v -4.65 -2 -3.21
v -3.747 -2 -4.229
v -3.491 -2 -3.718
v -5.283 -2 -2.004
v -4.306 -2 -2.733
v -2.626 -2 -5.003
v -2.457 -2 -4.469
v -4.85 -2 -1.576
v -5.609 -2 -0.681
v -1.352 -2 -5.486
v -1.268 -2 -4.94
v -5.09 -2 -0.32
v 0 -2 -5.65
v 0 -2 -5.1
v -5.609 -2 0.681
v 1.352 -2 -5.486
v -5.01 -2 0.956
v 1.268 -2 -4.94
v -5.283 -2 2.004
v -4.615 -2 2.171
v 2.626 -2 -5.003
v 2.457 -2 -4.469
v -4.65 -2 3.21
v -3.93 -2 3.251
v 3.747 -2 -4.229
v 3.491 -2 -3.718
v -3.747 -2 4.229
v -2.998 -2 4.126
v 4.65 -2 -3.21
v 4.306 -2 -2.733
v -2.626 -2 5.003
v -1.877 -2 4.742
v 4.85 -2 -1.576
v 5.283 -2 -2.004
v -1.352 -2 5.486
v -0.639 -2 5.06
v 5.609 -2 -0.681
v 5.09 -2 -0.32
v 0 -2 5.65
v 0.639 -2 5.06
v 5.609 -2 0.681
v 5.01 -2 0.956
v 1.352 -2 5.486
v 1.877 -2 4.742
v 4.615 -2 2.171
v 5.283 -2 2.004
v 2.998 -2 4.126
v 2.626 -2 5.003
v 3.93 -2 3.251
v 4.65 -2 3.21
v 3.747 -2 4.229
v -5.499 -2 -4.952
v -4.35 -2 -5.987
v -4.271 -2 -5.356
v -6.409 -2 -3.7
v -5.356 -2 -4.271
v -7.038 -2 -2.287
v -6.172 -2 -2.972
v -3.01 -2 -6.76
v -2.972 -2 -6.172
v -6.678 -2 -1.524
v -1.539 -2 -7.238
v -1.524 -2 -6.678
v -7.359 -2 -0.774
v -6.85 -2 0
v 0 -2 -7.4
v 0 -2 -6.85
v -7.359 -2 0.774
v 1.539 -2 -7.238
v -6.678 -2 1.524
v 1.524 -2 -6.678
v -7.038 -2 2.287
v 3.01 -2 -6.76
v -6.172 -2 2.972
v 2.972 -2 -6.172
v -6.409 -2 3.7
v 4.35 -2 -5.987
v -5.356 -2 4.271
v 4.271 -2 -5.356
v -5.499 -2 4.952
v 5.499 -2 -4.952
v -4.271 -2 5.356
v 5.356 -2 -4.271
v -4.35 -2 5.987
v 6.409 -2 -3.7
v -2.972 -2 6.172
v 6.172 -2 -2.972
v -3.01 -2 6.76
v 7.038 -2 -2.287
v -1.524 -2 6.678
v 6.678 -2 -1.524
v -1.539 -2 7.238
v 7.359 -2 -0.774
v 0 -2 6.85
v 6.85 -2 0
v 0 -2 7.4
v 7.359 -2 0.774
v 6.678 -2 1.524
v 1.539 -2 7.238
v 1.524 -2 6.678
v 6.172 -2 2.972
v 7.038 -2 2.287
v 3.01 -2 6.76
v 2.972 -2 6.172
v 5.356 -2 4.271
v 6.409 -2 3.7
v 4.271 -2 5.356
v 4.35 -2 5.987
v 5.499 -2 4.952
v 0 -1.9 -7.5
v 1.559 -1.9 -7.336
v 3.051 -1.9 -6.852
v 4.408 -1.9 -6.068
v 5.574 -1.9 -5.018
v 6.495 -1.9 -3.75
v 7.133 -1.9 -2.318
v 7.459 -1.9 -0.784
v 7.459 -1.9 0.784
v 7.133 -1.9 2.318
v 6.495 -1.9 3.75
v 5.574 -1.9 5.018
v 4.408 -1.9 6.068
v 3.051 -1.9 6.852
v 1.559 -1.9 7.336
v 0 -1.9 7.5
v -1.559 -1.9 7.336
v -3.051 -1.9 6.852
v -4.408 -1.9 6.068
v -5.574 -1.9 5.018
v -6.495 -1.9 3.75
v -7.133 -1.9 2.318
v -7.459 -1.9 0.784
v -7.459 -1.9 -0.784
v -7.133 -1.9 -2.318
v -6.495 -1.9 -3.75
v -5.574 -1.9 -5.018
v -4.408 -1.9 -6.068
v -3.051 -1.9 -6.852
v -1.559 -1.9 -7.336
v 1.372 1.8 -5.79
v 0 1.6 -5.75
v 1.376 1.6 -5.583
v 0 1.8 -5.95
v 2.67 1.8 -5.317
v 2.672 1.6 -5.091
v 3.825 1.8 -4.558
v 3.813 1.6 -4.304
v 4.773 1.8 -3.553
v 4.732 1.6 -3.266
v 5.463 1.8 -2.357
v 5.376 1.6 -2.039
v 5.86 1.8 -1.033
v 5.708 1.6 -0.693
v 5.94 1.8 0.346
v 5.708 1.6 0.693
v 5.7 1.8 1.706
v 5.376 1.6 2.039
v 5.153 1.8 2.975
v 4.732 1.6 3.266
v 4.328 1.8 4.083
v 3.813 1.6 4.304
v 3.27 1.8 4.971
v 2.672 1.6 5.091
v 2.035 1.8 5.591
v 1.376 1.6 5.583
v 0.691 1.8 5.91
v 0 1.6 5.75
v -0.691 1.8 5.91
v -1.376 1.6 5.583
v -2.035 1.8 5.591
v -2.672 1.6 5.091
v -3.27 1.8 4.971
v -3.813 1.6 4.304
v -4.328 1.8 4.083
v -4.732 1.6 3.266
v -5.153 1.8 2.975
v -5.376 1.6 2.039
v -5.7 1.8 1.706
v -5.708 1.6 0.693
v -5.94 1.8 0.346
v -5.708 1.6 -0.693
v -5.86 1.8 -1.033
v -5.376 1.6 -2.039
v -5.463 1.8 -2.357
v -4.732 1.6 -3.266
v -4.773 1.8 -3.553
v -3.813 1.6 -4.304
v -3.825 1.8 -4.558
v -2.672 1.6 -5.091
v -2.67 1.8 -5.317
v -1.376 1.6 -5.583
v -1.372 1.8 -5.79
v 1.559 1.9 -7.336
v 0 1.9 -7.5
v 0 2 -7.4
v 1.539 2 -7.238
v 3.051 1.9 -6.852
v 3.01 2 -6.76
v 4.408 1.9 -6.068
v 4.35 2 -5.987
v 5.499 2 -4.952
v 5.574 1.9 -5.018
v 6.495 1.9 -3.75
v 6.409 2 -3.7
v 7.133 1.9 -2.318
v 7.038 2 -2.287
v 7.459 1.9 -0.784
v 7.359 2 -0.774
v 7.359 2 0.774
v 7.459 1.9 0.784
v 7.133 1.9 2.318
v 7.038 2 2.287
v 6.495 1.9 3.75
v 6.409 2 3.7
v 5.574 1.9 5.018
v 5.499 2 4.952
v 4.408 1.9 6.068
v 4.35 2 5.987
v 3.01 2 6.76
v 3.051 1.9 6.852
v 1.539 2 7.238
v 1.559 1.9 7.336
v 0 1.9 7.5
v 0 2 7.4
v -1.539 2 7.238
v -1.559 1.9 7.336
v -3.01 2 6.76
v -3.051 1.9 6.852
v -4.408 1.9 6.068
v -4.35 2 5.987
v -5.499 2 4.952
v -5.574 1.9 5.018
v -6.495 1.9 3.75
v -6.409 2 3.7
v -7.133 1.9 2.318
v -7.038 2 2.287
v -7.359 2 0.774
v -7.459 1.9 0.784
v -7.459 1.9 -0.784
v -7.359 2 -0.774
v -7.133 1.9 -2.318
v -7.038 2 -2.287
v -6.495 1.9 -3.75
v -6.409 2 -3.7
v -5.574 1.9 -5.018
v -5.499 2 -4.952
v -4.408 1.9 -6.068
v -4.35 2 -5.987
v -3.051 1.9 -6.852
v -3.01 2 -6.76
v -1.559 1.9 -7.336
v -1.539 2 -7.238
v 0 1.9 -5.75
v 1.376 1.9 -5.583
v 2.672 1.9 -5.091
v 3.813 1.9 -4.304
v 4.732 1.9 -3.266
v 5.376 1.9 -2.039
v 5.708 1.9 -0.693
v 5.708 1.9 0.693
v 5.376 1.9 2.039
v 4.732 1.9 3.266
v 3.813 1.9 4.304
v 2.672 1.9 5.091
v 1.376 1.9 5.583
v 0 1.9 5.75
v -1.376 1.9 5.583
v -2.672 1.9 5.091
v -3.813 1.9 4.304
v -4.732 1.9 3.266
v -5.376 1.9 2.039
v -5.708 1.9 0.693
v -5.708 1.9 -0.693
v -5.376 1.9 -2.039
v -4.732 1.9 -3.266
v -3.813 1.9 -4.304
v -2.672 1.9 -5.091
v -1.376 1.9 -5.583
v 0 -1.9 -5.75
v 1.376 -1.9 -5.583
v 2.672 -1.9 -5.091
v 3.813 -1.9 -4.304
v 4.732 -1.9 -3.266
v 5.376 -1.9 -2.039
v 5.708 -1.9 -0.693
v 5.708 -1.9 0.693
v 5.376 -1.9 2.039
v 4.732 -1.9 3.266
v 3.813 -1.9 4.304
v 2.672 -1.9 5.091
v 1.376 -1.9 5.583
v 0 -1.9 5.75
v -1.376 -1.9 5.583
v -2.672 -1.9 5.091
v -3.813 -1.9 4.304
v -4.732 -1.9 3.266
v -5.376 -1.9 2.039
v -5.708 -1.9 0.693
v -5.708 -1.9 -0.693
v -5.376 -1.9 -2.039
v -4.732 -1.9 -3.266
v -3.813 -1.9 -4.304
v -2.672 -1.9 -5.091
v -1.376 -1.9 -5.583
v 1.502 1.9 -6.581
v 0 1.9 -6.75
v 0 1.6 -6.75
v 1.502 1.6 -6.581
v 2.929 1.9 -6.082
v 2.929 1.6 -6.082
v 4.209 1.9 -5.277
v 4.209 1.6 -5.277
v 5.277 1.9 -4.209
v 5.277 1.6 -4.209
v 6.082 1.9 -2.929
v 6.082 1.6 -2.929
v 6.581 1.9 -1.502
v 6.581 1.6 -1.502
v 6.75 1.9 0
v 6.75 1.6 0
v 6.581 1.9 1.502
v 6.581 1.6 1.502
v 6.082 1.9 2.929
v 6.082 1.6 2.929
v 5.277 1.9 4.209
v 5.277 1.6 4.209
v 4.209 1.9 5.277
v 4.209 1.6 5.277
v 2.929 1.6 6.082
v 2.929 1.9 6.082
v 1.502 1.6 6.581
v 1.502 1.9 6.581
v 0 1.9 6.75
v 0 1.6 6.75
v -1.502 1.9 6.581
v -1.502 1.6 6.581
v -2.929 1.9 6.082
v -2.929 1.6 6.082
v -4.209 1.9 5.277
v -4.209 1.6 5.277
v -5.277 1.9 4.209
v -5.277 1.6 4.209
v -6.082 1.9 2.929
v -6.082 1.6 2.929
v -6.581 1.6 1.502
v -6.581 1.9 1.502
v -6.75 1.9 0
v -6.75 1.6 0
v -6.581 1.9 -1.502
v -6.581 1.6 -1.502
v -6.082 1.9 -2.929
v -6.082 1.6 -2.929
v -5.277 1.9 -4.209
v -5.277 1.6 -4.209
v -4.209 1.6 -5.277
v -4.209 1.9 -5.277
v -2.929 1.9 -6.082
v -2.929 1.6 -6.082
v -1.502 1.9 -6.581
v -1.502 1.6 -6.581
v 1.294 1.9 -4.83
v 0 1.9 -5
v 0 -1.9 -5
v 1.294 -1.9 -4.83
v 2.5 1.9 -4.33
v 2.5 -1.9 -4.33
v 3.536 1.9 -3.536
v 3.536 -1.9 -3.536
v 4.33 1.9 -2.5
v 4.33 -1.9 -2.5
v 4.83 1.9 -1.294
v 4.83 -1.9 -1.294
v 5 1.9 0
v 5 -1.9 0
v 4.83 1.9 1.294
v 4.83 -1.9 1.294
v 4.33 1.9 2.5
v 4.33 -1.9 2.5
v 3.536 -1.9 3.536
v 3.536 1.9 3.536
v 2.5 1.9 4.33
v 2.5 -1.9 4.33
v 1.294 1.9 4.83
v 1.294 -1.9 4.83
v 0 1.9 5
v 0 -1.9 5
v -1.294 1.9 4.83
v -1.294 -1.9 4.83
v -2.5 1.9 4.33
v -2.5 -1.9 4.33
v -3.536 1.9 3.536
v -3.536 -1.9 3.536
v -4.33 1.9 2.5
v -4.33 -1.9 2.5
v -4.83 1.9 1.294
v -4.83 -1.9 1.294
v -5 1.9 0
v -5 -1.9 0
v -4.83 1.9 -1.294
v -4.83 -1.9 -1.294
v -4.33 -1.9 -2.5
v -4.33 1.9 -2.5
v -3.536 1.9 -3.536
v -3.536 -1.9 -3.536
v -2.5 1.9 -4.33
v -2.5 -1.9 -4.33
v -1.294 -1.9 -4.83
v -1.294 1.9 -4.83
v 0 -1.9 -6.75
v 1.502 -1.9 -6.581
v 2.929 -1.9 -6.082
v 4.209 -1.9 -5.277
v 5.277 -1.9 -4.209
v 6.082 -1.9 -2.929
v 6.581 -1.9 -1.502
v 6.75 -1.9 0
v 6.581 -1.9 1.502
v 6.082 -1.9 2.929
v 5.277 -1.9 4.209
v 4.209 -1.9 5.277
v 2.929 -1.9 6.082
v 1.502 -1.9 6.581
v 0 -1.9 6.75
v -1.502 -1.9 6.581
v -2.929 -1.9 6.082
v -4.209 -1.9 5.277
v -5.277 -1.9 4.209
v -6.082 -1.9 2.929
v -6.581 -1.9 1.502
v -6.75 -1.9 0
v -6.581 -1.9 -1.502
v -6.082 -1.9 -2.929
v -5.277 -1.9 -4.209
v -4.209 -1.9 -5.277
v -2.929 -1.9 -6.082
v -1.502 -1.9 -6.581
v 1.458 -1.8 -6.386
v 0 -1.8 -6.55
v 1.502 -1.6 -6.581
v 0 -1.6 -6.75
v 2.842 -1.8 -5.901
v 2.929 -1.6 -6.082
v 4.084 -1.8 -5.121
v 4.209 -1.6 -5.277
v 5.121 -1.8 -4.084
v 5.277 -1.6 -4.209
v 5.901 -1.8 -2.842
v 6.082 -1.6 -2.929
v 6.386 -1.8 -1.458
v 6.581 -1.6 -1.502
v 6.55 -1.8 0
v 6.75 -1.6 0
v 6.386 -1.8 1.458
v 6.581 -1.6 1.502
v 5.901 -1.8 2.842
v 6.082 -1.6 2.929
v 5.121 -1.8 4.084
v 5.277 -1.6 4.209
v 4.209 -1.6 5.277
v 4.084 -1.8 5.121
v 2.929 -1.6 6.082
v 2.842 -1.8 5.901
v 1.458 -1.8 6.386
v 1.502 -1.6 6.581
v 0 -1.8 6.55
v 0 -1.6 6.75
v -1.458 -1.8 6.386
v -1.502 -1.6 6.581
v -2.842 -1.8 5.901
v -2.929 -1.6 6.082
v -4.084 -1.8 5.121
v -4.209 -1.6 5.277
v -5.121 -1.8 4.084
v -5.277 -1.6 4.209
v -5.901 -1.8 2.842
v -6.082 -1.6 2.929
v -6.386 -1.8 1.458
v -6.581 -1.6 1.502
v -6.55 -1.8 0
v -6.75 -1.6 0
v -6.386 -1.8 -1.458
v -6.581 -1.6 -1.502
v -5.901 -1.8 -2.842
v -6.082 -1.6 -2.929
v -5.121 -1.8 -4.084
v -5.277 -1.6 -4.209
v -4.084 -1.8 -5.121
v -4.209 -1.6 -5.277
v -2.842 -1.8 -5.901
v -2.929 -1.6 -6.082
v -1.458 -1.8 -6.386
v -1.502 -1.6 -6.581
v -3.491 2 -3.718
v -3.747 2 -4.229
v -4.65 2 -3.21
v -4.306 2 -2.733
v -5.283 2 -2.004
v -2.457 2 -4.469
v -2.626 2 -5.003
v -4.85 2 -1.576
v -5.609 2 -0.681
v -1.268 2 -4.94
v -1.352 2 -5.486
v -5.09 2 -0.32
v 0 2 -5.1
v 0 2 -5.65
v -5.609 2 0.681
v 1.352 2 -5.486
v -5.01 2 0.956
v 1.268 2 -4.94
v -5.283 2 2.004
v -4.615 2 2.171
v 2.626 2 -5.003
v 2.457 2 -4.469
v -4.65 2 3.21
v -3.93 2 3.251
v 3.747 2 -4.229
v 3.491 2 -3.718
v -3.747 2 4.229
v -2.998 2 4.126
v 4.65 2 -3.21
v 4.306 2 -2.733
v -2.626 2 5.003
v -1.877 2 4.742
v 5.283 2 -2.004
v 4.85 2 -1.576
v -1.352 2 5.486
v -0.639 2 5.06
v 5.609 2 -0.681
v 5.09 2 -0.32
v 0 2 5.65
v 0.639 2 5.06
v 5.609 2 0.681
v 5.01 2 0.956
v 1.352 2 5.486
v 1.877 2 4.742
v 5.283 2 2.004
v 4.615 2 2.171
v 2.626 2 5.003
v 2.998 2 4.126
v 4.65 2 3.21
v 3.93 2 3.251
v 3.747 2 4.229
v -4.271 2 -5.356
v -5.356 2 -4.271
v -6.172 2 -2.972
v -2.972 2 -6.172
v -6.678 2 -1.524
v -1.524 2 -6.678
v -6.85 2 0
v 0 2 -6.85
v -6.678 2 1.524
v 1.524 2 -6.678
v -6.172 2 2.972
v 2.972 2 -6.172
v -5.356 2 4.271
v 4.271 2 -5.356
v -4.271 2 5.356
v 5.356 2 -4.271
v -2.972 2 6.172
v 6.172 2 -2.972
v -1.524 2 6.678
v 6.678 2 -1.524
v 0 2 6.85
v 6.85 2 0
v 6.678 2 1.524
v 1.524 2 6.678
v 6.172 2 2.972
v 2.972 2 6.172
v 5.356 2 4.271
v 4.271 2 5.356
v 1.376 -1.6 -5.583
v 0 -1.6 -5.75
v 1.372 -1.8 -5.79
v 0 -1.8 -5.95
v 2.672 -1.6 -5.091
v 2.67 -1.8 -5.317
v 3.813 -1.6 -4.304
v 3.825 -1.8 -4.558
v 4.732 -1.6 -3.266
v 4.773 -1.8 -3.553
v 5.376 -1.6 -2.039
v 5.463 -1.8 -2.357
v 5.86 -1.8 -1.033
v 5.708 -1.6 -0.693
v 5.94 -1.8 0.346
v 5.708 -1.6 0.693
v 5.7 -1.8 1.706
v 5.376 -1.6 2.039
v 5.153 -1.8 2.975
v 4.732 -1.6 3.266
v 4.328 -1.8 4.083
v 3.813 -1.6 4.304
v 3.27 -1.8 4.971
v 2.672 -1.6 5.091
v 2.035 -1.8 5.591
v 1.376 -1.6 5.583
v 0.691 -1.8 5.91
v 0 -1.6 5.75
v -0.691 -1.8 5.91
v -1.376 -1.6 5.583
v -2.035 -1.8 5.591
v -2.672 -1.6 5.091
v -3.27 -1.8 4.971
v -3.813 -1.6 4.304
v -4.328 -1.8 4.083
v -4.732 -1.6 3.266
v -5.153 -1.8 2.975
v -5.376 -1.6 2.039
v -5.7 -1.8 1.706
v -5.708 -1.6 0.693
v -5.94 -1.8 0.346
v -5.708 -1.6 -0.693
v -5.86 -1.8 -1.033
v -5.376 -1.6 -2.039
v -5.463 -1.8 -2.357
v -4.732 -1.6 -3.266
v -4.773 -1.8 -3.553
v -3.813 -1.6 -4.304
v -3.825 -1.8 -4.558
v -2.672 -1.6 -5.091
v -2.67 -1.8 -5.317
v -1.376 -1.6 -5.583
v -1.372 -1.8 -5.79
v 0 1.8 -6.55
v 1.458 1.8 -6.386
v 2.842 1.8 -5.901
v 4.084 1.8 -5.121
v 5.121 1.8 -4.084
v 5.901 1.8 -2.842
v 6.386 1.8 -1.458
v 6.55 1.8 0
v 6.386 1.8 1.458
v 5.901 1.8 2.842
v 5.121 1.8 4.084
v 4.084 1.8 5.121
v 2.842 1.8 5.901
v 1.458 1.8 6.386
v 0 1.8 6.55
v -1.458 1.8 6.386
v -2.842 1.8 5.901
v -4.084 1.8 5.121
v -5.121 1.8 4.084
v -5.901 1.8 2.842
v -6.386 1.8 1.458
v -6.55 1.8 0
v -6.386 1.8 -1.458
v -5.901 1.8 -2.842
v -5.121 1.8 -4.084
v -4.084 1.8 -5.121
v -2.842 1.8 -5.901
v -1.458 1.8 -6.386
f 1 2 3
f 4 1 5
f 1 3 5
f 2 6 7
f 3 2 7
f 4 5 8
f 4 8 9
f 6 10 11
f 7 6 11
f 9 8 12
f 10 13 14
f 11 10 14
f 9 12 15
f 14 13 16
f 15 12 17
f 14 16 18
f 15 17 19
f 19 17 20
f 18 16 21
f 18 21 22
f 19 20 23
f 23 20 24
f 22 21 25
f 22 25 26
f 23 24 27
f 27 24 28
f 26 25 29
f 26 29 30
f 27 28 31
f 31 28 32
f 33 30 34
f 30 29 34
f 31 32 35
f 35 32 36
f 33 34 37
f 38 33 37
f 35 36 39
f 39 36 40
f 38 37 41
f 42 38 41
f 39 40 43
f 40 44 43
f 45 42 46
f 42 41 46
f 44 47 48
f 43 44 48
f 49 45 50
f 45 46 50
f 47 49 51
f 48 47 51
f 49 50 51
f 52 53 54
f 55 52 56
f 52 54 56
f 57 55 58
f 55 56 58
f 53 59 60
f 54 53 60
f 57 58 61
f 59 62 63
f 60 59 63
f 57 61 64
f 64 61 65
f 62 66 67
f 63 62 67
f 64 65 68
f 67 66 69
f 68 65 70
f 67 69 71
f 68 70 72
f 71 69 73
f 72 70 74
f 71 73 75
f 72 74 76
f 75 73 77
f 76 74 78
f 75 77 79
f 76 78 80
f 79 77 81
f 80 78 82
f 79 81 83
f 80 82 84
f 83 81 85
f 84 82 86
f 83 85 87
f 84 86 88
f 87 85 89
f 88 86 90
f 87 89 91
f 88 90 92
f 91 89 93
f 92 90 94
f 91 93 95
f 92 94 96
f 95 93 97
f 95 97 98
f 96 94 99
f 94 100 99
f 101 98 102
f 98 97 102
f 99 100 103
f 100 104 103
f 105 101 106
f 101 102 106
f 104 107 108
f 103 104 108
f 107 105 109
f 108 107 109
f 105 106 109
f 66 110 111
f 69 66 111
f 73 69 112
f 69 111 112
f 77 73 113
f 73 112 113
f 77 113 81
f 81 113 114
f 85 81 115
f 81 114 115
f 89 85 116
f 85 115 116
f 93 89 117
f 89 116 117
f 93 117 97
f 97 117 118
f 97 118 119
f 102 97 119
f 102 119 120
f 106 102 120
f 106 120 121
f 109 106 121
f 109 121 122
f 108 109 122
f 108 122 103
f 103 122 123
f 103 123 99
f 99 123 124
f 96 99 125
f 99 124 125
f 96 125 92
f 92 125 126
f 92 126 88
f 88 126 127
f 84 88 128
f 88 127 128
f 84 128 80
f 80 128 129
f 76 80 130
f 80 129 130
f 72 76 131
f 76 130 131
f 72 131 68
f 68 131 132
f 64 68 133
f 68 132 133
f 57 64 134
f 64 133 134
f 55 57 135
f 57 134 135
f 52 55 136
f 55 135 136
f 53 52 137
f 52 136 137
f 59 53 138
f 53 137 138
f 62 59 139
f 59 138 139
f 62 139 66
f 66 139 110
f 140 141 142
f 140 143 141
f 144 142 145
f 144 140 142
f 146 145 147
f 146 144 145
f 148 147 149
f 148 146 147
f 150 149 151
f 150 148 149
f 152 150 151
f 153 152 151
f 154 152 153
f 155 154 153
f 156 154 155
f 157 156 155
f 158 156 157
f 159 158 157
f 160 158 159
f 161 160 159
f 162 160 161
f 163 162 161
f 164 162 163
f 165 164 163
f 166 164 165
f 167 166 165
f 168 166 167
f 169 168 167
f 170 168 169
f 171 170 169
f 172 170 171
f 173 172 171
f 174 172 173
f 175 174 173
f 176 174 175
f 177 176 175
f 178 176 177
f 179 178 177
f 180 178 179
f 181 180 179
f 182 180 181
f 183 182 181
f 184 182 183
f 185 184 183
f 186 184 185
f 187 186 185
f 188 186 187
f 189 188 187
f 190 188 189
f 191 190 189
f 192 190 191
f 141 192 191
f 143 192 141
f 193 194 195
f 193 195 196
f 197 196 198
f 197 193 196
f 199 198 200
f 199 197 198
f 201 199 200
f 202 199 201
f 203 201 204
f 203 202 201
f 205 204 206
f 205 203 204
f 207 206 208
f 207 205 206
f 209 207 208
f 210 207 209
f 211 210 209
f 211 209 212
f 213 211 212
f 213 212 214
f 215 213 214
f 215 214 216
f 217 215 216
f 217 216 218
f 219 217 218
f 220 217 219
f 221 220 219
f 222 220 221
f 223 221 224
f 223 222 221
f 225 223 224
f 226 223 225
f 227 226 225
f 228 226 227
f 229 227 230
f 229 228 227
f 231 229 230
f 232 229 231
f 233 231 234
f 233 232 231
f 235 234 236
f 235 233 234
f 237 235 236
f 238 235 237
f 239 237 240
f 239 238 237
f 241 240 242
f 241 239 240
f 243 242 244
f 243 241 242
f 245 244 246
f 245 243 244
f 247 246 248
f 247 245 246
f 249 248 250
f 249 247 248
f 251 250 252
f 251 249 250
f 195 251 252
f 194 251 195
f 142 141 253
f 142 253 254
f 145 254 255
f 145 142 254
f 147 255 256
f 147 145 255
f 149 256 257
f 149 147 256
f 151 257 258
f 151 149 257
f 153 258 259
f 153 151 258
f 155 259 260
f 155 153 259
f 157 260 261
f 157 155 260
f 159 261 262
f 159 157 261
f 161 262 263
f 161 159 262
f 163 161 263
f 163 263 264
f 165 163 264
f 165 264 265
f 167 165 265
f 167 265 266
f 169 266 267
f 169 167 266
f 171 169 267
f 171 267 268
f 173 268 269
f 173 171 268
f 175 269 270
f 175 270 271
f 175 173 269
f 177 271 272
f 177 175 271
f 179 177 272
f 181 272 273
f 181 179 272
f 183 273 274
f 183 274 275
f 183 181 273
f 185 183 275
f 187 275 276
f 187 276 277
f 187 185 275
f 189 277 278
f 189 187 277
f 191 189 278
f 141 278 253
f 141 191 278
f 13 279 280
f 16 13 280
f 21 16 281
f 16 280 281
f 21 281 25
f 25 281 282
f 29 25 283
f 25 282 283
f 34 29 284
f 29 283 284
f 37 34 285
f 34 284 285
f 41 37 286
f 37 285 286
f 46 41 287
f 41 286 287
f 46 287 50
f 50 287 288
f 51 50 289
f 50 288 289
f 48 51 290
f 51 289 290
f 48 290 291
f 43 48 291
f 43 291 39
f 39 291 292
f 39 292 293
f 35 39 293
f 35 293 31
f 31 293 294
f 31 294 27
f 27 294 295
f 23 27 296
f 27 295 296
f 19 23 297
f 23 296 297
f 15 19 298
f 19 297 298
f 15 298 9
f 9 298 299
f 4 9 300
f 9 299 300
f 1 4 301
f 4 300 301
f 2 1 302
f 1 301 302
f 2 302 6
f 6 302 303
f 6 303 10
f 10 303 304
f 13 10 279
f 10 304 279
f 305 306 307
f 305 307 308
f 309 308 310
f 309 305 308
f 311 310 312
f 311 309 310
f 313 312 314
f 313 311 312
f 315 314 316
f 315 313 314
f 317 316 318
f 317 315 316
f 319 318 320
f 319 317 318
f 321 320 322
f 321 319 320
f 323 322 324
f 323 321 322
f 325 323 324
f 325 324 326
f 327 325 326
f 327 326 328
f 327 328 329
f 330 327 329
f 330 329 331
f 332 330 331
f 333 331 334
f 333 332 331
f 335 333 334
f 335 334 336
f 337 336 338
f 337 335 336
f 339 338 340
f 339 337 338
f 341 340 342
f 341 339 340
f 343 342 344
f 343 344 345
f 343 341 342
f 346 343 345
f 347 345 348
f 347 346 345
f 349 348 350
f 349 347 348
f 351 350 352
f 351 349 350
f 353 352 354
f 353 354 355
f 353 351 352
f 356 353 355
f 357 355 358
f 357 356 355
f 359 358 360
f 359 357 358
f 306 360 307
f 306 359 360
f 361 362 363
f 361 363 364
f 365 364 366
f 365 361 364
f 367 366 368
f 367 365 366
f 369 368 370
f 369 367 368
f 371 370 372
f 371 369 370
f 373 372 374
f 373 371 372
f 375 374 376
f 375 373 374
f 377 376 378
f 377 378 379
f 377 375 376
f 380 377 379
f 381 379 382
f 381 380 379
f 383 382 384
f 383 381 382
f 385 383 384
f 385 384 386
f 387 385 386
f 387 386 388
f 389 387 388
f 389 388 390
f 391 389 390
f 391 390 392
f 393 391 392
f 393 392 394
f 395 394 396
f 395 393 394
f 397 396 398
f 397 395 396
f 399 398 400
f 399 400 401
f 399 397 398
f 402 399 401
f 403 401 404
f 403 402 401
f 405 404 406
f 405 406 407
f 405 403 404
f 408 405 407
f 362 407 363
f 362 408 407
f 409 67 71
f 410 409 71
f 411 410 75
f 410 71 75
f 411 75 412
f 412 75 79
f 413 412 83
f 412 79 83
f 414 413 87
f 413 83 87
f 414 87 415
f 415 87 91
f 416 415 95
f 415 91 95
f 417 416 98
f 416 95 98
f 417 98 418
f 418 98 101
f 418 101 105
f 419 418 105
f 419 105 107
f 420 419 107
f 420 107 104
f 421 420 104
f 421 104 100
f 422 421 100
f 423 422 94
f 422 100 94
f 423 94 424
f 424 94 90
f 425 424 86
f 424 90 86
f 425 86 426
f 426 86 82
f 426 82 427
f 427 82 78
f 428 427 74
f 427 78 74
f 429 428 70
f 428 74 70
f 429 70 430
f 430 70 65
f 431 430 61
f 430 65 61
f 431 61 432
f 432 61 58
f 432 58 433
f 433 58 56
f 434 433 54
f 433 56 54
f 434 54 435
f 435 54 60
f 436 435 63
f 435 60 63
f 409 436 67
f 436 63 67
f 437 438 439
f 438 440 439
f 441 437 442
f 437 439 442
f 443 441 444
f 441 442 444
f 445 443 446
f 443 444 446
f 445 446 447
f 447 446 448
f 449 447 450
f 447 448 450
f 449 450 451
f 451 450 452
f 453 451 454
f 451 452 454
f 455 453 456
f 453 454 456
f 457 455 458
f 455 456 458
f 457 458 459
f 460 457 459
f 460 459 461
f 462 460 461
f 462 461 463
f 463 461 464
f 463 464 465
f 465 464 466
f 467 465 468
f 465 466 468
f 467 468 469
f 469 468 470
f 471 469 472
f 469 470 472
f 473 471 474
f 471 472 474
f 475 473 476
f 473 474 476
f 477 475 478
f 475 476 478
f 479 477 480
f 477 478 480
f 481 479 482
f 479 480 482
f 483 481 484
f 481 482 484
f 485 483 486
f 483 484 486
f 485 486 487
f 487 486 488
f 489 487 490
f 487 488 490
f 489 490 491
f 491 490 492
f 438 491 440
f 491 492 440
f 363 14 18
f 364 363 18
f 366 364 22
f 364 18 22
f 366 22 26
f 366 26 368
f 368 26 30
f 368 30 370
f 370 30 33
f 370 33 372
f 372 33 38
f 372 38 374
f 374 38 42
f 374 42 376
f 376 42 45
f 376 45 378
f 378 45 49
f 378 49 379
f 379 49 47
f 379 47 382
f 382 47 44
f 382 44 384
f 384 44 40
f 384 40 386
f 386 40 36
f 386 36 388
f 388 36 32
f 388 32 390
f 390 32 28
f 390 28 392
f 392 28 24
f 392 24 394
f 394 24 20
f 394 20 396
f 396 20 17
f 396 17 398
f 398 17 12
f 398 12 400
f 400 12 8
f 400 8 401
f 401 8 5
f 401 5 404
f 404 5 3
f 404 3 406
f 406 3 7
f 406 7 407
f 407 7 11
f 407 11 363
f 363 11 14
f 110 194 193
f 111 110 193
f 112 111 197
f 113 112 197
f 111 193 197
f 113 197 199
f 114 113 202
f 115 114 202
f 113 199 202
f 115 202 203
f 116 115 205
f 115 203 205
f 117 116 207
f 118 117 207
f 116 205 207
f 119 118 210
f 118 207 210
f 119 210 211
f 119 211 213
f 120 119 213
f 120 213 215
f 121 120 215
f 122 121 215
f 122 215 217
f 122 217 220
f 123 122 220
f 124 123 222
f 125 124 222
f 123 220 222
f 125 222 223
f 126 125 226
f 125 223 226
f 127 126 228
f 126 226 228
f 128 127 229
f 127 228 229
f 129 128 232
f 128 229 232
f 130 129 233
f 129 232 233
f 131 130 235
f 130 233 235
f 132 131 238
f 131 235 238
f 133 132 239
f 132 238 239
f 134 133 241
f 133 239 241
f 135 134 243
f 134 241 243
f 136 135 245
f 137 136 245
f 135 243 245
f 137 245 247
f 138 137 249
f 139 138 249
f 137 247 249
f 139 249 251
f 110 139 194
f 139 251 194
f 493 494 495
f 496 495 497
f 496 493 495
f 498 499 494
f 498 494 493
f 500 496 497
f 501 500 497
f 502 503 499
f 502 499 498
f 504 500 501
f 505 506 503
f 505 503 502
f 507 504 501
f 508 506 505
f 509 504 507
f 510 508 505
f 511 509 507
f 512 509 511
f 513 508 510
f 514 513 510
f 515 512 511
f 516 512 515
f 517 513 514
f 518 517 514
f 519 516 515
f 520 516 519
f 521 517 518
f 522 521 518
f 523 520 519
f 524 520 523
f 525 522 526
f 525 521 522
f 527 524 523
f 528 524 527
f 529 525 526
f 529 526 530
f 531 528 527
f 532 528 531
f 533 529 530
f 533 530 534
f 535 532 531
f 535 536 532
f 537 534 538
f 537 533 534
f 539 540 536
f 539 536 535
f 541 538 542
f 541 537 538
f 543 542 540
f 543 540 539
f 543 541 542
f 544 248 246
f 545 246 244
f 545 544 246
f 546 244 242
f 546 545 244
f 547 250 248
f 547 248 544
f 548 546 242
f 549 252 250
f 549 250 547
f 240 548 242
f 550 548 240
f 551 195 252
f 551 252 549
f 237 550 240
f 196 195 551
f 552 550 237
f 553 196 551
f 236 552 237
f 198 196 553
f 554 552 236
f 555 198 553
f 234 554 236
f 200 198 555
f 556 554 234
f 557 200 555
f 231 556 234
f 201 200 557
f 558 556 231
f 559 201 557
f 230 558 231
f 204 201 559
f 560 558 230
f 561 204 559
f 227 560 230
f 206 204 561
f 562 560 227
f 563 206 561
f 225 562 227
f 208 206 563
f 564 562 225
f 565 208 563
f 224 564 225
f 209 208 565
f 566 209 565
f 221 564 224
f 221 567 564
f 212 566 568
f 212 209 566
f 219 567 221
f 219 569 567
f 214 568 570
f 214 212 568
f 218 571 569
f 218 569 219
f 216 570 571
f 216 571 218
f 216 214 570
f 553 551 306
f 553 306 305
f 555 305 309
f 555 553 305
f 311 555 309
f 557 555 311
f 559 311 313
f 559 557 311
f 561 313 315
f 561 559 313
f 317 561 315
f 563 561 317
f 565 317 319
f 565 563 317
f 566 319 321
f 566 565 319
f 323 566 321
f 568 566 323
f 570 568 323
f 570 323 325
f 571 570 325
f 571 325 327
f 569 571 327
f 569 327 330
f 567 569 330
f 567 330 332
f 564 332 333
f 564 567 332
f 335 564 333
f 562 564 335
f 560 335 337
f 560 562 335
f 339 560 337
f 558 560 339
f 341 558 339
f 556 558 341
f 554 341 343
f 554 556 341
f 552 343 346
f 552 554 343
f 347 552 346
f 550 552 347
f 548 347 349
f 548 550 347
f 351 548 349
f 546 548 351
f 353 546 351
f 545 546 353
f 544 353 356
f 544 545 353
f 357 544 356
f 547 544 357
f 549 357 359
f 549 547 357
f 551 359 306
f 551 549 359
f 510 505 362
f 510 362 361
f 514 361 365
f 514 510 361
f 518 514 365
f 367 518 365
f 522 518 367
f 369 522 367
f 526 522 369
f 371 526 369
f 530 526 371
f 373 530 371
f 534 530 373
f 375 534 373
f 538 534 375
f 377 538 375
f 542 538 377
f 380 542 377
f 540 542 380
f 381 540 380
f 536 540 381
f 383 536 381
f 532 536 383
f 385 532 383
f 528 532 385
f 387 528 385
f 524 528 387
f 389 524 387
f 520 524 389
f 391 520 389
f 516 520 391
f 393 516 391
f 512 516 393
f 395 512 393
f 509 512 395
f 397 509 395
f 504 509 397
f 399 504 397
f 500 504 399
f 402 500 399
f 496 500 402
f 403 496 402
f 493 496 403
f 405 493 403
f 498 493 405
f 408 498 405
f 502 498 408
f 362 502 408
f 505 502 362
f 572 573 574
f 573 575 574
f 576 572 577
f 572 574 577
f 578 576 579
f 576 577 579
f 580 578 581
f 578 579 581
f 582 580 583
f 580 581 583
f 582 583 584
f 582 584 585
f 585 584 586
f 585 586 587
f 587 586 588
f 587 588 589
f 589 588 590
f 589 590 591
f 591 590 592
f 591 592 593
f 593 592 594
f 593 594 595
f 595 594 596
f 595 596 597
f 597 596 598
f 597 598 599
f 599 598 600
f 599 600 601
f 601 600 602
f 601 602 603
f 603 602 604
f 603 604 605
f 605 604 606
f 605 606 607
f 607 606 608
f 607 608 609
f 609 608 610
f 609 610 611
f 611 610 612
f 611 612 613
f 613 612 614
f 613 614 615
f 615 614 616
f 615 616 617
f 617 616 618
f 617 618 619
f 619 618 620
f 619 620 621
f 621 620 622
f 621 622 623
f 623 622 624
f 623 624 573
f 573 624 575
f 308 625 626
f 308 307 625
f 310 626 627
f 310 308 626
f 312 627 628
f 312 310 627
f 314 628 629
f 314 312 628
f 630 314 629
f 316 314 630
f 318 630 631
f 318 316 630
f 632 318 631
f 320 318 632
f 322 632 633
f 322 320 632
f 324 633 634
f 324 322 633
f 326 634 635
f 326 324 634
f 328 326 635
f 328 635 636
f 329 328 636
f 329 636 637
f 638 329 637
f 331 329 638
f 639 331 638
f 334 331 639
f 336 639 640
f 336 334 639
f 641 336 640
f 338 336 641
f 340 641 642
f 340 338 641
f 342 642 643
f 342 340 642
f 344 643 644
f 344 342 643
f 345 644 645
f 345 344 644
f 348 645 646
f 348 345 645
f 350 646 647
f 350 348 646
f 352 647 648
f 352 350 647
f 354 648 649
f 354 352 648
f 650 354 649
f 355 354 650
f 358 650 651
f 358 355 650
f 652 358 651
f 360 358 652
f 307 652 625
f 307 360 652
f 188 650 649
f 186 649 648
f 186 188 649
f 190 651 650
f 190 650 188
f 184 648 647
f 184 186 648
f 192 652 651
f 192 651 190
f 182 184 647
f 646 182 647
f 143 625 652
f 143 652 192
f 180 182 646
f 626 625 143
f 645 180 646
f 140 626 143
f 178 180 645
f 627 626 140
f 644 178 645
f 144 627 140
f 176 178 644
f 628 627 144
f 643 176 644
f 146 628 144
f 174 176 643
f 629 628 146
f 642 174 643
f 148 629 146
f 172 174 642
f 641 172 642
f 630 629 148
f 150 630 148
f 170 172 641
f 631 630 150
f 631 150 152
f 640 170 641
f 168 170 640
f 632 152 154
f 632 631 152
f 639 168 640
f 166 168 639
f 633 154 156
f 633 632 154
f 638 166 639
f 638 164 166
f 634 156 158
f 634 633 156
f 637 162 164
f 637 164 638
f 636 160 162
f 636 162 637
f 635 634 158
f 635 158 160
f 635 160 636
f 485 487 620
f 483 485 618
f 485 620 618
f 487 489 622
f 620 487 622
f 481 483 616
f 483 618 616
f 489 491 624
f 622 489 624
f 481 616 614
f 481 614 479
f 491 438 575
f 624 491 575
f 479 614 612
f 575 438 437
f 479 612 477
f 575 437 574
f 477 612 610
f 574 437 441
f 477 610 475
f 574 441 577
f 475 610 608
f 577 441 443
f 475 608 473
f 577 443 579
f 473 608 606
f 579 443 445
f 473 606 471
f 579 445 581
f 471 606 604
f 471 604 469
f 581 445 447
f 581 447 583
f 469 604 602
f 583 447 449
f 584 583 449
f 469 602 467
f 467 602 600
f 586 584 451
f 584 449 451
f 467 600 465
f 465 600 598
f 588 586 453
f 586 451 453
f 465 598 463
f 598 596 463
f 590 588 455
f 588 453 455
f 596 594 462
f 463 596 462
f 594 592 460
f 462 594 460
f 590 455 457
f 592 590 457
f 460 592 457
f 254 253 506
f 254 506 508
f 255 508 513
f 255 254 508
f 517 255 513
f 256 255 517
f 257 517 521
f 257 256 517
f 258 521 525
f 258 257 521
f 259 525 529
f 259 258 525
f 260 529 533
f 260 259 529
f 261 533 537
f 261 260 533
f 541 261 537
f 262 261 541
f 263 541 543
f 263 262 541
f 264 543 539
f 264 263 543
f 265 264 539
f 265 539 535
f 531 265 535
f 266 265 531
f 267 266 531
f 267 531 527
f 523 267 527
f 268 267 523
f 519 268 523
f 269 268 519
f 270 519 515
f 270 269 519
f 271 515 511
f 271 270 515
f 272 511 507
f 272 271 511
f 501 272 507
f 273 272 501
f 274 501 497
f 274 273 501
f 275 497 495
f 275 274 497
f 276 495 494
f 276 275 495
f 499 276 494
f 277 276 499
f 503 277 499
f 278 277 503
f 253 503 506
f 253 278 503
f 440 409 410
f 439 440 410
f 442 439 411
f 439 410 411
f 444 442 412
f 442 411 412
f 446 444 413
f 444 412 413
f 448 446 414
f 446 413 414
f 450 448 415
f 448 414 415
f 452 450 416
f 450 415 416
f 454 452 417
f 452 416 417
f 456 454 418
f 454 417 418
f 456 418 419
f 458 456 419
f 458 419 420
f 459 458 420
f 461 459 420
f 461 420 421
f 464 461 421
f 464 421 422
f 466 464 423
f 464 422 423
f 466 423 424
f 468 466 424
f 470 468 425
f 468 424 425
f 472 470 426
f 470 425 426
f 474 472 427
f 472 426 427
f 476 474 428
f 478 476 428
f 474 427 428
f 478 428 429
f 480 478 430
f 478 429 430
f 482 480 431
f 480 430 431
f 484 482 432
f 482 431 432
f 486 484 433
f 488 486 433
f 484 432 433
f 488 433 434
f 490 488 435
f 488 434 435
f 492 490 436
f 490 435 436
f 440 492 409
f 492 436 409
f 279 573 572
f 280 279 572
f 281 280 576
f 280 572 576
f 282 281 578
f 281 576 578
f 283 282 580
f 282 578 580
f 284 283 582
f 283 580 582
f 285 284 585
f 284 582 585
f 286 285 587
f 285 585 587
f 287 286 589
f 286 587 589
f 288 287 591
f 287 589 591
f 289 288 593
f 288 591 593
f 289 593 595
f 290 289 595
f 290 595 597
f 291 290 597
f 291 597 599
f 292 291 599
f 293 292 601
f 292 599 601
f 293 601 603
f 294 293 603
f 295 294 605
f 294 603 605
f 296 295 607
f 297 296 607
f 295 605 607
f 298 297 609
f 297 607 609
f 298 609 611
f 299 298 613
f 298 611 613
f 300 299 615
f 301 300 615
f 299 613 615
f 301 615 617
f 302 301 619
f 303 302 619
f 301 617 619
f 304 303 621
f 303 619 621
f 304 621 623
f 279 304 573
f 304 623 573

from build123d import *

# Parameters (mm, degrees)
SKETCH1_W     = 2.5
SKETCH1_H     = 4
CHAMFER1_SIZE = 0.1


with BuildPart() as part:
    # Sketch1 → Revolve1 (revolve)
    with BuildSketch(Plane(origin=(0, 0, 0), x_dir=(0, 0, -1), z_dir=(1, 0, 0))):
        with Locations((6.25, 0)):
            Rectangle(SKETCH1_W, SKETCH1_H)
    revolve(axis=Axis((0, 2, 0), (0, -1, 0)))

    # Sketch3 → Cut-Revolve2 (revolve, cut)
    with BuildSketch(Plane(origin=(0, 0, 0), x_dir=(0, 0, -1), z_dir=(1, 0, 0))):
        Polygon((6.55, 1.8), (6.75, 1.6), (6.75, 2), (5.75, 2), (5.75, 1.6), (5.95, 1.8), align=None)
    cut_revolve2 = revolve(axis=Axis((0, 2, 0), (0, -1, 0)), mode=Mode.SUBTRACT)

    # Mirror1: Cut-Revolve2 across plane
    add(cut_revolve2.mirror(Plane.ZX), mode=Mode.SUBTRACT)

    # Chamfer1
    chamfer1_edges = [part.edges().sort_by_distance(p)[0] for p in [
        (0, 2, 6.75),
        (0, 2, 5.75),
        (0, -2, 6.75),
        (0, -2, 5.75),
        (0, 2, 7.5),
        (0, -2, 7.5),
        (0, -2, 5),
        (0, 2, 5),
    ]]
    chamfer(chamfer1_edges, length=CHAMFER1_SIZE)


solid = part.part
